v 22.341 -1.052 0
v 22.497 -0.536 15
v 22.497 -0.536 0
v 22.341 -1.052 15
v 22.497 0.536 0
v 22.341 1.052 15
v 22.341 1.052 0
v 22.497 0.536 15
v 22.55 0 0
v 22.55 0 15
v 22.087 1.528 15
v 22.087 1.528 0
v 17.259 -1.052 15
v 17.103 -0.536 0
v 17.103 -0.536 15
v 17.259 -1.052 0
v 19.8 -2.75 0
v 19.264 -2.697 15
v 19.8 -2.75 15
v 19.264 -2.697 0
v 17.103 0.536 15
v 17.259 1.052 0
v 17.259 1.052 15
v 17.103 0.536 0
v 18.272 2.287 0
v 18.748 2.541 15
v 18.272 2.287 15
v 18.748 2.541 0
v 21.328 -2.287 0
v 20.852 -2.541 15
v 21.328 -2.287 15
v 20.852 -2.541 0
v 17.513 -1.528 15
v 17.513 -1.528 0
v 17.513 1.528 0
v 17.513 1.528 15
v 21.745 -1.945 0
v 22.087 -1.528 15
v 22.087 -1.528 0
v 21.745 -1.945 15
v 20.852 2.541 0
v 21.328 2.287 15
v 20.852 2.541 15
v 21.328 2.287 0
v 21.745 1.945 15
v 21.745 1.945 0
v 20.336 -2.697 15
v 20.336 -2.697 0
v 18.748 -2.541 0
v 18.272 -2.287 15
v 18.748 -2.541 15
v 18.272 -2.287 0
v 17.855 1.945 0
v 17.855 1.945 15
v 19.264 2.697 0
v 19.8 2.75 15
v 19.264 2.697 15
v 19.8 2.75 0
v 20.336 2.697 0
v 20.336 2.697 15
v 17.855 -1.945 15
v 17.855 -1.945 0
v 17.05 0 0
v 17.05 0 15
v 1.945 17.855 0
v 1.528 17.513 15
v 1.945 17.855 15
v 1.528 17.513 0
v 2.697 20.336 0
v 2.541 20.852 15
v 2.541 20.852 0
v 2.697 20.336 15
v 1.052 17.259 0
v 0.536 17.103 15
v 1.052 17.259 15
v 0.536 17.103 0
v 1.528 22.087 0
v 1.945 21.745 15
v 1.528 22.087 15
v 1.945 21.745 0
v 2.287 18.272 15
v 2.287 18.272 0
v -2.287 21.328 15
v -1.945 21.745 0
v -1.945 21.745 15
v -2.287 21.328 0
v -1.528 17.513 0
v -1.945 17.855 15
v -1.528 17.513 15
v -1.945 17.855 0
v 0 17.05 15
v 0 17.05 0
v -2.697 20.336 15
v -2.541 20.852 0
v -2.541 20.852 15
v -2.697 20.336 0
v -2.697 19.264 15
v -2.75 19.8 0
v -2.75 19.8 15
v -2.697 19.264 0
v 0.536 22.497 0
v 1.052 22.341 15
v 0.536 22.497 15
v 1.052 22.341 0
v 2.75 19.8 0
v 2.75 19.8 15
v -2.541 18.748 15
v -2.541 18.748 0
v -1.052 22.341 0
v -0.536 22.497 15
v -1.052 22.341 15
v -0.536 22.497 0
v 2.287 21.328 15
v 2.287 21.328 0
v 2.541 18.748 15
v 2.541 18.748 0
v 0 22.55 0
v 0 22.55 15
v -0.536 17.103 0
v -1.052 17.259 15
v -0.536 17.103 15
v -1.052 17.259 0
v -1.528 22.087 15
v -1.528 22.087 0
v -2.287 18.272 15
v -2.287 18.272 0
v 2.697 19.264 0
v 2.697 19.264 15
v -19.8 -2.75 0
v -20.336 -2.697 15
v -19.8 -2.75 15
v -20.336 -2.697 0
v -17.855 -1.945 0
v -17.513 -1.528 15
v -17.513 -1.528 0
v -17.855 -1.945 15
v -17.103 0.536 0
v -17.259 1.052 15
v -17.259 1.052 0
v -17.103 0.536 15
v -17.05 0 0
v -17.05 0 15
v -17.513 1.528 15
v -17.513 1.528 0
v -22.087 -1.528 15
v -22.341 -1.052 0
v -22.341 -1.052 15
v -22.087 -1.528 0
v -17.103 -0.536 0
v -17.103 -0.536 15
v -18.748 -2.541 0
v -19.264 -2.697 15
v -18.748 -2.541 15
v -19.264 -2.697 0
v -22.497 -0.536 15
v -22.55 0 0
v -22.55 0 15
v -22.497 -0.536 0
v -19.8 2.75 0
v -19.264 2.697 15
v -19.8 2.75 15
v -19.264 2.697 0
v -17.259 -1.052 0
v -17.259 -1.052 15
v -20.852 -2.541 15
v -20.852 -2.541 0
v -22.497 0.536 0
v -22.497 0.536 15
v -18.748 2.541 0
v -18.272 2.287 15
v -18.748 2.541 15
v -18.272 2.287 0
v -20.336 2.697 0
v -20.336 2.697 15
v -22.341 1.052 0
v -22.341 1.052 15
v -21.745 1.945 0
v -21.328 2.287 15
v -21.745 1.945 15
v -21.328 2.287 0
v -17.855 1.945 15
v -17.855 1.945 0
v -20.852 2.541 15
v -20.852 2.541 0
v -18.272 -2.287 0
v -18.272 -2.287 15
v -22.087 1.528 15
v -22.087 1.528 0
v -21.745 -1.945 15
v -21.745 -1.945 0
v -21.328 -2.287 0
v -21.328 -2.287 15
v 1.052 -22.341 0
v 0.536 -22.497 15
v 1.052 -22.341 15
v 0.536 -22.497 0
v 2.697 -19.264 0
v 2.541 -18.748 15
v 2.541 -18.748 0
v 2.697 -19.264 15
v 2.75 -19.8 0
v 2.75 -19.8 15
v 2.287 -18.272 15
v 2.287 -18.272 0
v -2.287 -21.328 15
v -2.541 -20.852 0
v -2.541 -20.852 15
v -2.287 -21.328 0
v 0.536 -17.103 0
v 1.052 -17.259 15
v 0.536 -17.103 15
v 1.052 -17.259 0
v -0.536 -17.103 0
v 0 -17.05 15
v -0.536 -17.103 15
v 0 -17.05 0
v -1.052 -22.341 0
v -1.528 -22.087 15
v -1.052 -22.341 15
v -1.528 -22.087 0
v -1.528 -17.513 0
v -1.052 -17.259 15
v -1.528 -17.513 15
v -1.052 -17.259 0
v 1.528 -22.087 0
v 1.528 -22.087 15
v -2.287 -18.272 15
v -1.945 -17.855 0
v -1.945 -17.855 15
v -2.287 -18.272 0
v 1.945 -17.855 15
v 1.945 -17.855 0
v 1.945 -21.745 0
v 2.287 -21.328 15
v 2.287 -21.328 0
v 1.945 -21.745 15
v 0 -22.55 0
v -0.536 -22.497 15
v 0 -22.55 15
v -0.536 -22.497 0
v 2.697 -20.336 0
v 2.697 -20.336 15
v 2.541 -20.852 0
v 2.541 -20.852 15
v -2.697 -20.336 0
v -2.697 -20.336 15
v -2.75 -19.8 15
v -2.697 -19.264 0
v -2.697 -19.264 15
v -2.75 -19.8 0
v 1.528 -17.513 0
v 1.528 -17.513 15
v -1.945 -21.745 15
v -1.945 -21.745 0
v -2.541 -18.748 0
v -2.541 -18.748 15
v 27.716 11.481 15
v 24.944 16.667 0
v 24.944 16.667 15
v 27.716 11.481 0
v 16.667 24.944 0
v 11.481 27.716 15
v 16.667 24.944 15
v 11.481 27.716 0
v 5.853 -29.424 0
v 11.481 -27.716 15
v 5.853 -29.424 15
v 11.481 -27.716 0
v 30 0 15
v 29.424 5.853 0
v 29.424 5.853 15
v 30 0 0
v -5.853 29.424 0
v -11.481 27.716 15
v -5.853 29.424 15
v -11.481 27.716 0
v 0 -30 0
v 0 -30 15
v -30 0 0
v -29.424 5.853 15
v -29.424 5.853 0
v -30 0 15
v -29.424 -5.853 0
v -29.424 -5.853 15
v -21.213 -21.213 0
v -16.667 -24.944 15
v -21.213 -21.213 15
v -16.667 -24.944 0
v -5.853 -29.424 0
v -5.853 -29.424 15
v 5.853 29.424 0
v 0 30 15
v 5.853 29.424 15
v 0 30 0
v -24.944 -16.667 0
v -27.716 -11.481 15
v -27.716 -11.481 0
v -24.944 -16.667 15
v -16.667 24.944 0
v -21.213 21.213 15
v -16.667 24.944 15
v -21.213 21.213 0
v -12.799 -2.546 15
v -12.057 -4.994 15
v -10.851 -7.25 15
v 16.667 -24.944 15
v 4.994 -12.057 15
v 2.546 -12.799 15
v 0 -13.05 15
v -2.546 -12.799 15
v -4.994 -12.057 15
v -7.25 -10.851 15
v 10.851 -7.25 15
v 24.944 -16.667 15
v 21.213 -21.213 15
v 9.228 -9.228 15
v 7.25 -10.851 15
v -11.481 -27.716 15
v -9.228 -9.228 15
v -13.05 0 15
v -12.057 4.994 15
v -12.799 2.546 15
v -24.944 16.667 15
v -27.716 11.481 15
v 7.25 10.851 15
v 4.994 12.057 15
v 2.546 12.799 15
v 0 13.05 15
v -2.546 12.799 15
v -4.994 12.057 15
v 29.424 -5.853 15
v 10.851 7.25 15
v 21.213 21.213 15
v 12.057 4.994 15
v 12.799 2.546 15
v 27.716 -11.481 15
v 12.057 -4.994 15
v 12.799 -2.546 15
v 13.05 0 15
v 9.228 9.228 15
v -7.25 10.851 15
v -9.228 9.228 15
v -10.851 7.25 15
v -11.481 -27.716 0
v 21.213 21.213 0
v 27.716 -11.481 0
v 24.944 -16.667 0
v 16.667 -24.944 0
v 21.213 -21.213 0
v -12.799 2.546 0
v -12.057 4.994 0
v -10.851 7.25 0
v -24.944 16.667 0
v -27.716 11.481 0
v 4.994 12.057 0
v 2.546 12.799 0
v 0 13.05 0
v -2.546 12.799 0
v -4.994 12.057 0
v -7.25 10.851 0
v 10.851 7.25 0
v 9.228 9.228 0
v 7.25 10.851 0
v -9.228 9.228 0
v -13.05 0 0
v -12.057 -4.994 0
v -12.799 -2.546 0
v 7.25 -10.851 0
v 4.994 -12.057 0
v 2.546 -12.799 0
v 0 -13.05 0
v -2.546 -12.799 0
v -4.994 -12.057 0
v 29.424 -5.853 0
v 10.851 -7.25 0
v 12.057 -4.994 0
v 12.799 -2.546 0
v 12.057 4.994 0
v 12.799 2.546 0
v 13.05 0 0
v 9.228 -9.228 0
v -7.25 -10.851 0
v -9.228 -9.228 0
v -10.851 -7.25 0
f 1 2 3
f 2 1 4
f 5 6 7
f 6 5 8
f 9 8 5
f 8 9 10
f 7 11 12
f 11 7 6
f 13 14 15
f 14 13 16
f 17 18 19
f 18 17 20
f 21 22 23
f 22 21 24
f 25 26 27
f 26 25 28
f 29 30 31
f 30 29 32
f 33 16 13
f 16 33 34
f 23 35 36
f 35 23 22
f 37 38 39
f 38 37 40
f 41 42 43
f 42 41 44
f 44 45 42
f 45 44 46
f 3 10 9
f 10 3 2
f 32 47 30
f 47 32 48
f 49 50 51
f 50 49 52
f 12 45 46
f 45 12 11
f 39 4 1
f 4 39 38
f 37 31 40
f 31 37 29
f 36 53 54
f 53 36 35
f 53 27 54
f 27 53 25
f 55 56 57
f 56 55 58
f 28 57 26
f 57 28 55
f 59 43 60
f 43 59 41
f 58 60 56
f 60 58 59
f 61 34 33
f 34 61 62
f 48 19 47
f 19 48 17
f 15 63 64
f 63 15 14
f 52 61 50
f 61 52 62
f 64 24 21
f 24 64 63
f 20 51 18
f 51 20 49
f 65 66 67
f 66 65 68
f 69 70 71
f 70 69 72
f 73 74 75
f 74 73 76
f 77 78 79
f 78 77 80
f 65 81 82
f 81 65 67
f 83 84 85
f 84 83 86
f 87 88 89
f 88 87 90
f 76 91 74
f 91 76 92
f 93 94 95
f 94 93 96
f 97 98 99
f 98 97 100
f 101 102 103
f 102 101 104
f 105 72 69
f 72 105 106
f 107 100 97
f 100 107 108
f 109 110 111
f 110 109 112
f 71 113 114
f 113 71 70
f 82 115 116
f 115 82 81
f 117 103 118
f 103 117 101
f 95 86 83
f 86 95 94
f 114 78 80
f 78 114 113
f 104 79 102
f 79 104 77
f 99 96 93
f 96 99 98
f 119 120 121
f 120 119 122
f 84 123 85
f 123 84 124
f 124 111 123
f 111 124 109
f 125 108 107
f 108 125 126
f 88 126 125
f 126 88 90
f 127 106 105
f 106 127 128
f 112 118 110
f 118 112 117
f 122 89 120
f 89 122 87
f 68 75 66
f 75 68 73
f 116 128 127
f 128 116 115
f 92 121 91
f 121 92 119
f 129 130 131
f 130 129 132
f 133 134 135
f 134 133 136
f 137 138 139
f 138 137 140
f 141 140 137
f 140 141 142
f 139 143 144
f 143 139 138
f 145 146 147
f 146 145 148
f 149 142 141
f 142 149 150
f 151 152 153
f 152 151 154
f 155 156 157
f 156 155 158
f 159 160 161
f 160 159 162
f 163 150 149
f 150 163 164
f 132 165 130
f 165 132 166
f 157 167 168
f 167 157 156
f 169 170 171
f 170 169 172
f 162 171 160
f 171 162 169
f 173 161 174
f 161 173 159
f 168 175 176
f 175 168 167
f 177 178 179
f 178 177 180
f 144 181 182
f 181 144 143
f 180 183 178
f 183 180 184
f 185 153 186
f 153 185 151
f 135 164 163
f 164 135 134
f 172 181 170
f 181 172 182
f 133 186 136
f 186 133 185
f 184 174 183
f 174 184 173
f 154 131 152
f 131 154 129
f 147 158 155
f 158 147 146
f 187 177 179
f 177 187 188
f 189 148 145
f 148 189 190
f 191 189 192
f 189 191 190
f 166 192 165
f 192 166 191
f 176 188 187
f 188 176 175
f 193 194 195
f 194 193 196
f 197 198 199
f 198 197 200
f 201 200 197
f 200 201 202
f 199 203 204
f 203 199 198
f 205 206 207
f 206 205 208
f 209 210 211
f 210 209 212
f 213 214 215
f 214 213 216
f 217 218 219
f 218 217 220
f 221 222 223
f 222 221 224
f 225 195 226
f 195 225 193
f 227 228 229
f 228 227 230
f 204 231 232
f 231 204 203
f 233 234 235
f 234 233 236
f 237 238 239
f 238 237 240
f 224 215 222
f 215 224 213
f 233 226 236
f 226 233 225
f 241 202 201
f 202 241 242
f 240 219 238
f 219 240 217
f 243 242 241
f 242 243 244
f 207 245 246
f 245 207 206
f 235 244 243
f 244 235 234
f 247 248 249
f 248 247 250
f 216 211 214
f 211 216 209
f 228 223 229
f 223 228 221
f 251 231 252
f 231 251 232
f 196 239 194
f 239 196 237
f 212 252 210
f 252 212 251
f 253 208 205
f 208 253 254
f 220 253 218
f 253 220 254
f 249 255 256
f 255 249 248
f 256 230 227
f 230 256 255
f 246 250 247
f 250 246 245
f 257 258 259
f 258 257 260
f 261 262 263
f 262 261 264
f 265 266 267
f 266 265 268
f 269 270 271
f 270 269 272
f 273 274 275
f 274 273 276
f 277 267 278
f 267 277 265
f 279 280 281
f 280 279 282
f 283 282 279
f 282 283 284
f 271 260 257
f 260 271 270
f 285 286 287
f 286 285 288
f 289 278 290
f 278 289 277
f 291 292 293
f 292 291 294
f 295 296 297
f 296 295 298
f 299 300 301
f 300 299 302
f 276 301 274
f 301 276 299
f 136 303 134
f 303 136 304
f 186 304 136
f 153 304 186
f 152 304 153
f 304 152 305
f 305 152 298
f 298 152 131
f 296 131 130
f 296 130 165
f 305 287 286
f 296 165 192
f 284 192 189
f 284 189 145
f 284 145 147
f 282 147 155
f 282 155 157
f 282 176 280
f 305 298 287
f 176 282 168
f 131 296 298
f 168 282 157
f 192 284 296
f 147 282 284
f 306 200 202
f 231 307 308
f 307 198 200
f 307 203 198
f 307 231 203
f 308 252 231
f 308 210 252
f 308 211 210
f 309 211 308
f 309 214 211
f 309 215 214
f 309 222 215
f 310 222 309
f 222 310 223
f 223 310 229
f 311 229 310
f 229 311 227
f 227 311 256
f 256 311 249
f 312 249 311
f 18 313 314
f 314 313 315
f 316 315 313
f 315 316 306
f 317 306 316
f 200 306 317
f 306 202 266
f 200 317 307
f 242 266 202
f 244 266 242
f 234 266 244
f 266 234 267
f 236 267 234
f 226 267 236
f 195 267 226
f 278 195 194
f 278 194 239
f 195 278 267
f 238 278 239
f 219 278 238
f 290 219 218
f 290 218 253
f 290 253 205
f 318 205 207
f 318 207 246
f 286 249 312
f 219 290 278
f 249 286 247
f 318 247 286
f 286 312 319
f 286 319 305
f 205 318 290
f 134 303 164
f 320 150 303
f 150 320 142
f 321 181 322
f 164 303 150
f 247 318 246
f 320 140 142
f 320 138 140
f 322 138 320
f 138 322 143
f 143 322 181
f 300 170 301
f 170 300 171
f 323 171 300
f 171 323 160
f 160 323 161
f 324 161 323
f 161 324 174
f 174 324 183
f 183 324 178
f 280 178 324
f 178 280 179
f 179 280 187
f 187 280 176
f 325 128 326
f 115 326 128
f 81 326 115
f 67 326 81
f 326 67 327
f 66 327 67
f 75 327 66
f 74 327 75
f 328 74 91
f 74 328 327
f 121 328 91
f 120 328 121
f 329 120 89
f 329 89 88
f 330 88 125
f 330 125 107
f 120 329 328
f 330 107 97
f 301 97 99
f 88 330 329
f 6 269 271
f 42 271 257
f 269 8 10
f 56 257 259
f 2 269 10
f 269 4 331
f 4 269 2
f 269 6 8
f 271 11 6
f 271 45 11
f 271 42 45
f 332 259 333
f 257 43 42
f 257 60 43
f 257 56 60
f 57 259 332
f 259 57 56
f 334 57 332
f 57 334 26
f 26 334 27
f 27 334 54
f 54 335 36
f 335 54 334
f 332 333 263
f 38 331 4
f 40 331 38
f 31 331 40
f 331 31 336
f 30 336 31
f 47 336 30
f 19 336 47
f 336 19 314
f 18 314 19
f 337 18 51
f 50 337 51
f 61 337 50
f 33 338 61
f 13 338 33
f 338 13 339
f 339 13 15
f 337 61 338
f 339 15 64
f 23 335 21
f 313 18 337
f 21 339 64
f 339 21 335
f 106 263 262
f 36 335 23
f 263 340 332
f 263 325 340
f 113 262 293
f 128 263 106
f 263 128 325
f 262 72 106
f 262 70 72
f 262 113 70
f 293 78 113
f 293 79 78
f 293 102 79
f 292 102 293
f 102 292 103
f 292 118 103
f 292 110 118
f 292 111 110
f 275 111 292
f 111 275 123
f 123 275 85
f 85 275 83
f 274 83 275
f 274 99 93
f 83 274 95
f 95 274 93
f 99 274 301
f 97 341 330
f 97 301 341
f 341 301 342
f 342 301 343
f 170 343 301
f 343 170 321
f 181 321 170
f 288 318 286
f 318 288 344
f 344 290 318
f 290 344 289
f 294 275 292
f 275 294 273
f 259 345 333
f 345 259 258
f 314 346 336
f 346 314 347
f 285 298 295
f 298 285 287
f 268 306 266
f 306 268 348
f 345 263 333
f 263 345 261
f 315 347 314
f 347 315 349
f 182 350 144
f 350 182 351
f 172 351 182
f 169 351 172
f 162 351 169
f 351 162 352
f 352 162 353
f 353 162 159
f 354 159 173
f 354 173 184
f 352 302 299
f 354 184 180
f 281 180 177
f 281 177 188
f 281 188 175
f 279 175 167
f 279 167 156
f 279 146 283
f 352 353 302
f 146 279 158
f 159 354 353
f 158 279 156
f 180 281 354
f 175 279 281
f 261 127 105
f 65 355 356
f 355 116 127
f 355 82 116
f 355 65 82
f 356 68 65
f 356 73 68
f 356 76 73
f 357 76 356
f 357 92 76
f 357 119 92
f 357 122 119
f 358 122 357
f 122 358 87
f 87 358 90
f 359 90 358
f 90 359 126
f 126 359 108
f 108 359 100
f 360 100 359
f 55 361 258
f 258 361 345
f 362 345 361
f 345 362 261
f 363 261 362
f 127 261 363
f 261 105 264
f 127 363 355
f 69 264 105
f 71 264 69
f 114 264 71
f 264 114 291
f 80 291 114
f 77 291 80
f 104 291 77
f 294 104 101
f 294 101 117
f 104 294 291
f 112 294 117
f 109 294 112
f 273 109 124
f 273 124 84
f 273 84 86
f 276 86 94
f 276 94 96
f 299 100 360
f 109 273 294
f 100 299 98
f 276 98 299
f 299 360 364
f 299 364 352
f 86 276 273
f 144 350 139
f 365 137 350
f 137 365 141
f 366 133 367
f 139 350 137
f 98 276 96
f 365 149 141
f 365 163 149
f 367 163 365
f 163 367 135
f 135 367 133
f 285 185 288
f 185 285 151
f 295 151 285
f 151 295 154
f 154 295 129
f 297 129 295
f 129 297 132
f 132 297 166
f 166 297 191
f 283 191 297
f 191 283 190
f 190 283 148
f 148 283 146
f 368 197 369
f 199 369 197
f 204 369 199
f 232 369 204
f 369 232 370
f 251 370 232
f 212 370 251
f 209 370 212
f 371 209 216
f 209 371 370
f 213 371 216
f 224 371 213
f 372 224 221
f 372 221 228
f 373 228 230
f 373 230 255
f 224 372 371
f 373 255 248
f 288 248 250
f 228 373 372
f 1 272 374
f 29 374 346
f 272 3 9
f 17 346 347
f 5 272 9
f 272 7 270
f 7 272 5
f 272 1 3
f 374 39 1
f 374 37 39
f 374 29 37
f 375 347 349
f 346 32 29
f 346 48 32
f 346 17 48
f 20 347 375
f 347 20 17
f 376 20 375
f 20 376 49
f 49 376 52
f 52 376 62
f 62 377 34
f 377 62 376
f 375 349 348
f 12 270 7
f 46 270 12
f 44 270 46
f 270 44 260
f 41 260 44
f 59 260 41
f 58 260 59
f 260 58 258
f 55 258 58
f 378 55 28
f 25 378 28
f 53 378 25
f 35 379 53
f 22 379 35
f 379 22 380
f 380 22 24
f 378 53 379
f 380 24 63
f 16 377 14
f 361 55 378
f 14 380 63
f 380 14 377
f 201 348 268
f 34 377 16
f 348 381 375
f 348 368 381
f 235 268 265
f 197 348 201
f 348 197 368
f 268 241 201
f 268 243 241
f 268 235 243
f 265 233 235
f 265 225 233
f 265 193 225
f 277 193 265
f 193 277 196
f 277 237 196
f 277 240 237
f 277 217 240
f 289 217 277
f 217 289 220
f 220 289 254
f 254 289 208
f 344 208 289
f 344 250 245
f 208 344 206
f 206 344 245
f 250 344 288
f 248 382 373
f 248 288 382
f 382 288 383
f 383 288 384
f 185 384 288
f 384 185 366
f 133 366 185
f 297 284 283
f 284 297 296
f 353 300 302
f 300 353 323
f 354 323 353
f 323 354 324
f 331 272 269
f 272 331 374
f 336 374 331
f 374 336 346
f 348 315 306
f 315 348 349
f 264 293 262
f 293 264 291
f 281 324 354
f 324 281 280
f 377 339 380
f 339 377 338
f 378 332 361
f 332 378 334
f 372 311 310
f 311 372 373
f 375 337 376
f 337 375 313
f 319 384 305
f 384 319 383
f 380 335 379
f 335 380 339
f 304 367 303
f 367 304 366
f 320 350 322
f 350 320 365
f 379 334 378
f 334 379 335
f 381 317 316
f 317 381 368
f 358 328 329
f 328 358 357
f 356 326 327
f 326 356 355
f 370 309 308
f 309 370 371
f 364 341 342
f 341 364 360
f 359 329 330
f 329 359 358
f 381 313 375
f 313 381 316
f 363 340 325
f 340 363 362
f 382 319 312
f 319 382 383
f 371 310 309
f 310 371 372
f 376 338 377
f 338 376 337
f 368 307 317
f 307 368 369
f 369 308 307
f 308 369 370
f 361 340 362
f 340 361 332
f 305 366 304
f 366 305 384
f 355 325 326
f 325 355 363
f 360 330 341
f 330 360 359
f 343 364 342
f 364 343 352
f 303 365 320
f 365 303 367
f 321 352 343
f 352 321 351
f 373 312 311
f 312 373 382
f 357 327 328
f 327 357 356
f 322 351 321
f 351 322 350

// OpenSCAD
$fn = 32;

// ----------------------------------------------------------------------
// Flange Ø60 x 15
// 4 holes on a Ø39.6 bolt circle, bolted joints
// ----------------------------------------------------------------------

// --- parameters (mm) ---
flange_d = 60;   // outside diameter of the flange
thickness = 15;  // flange thickness
holes = 4;       // number of bolt holes
pcd = 39.6;      // bolt circle diameter
start_deg = 0;   // angle of the first hole, from +X
hole_d = 5.5;    // bolt hole diameter
bore_d = 26.1;   // central through bore
hub_d = 38.1;    // hub outside diameter
hub_h = 0;       // hub height above the flange face (0 = no hub)

// --- derived feature positions (mm) ---
height = thickness + hub_h;  // = 15   overall height of the part
pcd_r = pcd / 2;             // = 19.8   bolt circle radius
hole_step = 360 / holes;     // = 90   angular pitch
feature_centers = [
  [pcd_r * cos(start_deg + 0 * hole_step), pcd_r * sin(start_deg + 0 * hole_step)],
  [pcd_r * cos(start_deg + 1 * hole_step), pcd_r * sin(start_deg + 1 * hole_step)],
  [pcd_r * cos(start_deg + 2 * hole_step), pcd_r * sin(start_deg + 2 * hole_step)],
  [pcd_r * cos(start_deg + 3 * hole_step), pcd_r * sin(start_deg + 3 * hole_step)]
];   // bolt hole centres on the pitch circle

// flange disc, every hole and the bore cut straight through
difference() {
  union() {
    cylinder(d = flange_d, h = thickness);
  }
  translate([0, 0, -1]) cylinder(d = bore_d, h = height + 2);  // bore, through
  for (centre = feature_centers)
    translate([centre[0], centre[1], -1]) cylinder(d = hole_d, h = thickness + 2);
}
